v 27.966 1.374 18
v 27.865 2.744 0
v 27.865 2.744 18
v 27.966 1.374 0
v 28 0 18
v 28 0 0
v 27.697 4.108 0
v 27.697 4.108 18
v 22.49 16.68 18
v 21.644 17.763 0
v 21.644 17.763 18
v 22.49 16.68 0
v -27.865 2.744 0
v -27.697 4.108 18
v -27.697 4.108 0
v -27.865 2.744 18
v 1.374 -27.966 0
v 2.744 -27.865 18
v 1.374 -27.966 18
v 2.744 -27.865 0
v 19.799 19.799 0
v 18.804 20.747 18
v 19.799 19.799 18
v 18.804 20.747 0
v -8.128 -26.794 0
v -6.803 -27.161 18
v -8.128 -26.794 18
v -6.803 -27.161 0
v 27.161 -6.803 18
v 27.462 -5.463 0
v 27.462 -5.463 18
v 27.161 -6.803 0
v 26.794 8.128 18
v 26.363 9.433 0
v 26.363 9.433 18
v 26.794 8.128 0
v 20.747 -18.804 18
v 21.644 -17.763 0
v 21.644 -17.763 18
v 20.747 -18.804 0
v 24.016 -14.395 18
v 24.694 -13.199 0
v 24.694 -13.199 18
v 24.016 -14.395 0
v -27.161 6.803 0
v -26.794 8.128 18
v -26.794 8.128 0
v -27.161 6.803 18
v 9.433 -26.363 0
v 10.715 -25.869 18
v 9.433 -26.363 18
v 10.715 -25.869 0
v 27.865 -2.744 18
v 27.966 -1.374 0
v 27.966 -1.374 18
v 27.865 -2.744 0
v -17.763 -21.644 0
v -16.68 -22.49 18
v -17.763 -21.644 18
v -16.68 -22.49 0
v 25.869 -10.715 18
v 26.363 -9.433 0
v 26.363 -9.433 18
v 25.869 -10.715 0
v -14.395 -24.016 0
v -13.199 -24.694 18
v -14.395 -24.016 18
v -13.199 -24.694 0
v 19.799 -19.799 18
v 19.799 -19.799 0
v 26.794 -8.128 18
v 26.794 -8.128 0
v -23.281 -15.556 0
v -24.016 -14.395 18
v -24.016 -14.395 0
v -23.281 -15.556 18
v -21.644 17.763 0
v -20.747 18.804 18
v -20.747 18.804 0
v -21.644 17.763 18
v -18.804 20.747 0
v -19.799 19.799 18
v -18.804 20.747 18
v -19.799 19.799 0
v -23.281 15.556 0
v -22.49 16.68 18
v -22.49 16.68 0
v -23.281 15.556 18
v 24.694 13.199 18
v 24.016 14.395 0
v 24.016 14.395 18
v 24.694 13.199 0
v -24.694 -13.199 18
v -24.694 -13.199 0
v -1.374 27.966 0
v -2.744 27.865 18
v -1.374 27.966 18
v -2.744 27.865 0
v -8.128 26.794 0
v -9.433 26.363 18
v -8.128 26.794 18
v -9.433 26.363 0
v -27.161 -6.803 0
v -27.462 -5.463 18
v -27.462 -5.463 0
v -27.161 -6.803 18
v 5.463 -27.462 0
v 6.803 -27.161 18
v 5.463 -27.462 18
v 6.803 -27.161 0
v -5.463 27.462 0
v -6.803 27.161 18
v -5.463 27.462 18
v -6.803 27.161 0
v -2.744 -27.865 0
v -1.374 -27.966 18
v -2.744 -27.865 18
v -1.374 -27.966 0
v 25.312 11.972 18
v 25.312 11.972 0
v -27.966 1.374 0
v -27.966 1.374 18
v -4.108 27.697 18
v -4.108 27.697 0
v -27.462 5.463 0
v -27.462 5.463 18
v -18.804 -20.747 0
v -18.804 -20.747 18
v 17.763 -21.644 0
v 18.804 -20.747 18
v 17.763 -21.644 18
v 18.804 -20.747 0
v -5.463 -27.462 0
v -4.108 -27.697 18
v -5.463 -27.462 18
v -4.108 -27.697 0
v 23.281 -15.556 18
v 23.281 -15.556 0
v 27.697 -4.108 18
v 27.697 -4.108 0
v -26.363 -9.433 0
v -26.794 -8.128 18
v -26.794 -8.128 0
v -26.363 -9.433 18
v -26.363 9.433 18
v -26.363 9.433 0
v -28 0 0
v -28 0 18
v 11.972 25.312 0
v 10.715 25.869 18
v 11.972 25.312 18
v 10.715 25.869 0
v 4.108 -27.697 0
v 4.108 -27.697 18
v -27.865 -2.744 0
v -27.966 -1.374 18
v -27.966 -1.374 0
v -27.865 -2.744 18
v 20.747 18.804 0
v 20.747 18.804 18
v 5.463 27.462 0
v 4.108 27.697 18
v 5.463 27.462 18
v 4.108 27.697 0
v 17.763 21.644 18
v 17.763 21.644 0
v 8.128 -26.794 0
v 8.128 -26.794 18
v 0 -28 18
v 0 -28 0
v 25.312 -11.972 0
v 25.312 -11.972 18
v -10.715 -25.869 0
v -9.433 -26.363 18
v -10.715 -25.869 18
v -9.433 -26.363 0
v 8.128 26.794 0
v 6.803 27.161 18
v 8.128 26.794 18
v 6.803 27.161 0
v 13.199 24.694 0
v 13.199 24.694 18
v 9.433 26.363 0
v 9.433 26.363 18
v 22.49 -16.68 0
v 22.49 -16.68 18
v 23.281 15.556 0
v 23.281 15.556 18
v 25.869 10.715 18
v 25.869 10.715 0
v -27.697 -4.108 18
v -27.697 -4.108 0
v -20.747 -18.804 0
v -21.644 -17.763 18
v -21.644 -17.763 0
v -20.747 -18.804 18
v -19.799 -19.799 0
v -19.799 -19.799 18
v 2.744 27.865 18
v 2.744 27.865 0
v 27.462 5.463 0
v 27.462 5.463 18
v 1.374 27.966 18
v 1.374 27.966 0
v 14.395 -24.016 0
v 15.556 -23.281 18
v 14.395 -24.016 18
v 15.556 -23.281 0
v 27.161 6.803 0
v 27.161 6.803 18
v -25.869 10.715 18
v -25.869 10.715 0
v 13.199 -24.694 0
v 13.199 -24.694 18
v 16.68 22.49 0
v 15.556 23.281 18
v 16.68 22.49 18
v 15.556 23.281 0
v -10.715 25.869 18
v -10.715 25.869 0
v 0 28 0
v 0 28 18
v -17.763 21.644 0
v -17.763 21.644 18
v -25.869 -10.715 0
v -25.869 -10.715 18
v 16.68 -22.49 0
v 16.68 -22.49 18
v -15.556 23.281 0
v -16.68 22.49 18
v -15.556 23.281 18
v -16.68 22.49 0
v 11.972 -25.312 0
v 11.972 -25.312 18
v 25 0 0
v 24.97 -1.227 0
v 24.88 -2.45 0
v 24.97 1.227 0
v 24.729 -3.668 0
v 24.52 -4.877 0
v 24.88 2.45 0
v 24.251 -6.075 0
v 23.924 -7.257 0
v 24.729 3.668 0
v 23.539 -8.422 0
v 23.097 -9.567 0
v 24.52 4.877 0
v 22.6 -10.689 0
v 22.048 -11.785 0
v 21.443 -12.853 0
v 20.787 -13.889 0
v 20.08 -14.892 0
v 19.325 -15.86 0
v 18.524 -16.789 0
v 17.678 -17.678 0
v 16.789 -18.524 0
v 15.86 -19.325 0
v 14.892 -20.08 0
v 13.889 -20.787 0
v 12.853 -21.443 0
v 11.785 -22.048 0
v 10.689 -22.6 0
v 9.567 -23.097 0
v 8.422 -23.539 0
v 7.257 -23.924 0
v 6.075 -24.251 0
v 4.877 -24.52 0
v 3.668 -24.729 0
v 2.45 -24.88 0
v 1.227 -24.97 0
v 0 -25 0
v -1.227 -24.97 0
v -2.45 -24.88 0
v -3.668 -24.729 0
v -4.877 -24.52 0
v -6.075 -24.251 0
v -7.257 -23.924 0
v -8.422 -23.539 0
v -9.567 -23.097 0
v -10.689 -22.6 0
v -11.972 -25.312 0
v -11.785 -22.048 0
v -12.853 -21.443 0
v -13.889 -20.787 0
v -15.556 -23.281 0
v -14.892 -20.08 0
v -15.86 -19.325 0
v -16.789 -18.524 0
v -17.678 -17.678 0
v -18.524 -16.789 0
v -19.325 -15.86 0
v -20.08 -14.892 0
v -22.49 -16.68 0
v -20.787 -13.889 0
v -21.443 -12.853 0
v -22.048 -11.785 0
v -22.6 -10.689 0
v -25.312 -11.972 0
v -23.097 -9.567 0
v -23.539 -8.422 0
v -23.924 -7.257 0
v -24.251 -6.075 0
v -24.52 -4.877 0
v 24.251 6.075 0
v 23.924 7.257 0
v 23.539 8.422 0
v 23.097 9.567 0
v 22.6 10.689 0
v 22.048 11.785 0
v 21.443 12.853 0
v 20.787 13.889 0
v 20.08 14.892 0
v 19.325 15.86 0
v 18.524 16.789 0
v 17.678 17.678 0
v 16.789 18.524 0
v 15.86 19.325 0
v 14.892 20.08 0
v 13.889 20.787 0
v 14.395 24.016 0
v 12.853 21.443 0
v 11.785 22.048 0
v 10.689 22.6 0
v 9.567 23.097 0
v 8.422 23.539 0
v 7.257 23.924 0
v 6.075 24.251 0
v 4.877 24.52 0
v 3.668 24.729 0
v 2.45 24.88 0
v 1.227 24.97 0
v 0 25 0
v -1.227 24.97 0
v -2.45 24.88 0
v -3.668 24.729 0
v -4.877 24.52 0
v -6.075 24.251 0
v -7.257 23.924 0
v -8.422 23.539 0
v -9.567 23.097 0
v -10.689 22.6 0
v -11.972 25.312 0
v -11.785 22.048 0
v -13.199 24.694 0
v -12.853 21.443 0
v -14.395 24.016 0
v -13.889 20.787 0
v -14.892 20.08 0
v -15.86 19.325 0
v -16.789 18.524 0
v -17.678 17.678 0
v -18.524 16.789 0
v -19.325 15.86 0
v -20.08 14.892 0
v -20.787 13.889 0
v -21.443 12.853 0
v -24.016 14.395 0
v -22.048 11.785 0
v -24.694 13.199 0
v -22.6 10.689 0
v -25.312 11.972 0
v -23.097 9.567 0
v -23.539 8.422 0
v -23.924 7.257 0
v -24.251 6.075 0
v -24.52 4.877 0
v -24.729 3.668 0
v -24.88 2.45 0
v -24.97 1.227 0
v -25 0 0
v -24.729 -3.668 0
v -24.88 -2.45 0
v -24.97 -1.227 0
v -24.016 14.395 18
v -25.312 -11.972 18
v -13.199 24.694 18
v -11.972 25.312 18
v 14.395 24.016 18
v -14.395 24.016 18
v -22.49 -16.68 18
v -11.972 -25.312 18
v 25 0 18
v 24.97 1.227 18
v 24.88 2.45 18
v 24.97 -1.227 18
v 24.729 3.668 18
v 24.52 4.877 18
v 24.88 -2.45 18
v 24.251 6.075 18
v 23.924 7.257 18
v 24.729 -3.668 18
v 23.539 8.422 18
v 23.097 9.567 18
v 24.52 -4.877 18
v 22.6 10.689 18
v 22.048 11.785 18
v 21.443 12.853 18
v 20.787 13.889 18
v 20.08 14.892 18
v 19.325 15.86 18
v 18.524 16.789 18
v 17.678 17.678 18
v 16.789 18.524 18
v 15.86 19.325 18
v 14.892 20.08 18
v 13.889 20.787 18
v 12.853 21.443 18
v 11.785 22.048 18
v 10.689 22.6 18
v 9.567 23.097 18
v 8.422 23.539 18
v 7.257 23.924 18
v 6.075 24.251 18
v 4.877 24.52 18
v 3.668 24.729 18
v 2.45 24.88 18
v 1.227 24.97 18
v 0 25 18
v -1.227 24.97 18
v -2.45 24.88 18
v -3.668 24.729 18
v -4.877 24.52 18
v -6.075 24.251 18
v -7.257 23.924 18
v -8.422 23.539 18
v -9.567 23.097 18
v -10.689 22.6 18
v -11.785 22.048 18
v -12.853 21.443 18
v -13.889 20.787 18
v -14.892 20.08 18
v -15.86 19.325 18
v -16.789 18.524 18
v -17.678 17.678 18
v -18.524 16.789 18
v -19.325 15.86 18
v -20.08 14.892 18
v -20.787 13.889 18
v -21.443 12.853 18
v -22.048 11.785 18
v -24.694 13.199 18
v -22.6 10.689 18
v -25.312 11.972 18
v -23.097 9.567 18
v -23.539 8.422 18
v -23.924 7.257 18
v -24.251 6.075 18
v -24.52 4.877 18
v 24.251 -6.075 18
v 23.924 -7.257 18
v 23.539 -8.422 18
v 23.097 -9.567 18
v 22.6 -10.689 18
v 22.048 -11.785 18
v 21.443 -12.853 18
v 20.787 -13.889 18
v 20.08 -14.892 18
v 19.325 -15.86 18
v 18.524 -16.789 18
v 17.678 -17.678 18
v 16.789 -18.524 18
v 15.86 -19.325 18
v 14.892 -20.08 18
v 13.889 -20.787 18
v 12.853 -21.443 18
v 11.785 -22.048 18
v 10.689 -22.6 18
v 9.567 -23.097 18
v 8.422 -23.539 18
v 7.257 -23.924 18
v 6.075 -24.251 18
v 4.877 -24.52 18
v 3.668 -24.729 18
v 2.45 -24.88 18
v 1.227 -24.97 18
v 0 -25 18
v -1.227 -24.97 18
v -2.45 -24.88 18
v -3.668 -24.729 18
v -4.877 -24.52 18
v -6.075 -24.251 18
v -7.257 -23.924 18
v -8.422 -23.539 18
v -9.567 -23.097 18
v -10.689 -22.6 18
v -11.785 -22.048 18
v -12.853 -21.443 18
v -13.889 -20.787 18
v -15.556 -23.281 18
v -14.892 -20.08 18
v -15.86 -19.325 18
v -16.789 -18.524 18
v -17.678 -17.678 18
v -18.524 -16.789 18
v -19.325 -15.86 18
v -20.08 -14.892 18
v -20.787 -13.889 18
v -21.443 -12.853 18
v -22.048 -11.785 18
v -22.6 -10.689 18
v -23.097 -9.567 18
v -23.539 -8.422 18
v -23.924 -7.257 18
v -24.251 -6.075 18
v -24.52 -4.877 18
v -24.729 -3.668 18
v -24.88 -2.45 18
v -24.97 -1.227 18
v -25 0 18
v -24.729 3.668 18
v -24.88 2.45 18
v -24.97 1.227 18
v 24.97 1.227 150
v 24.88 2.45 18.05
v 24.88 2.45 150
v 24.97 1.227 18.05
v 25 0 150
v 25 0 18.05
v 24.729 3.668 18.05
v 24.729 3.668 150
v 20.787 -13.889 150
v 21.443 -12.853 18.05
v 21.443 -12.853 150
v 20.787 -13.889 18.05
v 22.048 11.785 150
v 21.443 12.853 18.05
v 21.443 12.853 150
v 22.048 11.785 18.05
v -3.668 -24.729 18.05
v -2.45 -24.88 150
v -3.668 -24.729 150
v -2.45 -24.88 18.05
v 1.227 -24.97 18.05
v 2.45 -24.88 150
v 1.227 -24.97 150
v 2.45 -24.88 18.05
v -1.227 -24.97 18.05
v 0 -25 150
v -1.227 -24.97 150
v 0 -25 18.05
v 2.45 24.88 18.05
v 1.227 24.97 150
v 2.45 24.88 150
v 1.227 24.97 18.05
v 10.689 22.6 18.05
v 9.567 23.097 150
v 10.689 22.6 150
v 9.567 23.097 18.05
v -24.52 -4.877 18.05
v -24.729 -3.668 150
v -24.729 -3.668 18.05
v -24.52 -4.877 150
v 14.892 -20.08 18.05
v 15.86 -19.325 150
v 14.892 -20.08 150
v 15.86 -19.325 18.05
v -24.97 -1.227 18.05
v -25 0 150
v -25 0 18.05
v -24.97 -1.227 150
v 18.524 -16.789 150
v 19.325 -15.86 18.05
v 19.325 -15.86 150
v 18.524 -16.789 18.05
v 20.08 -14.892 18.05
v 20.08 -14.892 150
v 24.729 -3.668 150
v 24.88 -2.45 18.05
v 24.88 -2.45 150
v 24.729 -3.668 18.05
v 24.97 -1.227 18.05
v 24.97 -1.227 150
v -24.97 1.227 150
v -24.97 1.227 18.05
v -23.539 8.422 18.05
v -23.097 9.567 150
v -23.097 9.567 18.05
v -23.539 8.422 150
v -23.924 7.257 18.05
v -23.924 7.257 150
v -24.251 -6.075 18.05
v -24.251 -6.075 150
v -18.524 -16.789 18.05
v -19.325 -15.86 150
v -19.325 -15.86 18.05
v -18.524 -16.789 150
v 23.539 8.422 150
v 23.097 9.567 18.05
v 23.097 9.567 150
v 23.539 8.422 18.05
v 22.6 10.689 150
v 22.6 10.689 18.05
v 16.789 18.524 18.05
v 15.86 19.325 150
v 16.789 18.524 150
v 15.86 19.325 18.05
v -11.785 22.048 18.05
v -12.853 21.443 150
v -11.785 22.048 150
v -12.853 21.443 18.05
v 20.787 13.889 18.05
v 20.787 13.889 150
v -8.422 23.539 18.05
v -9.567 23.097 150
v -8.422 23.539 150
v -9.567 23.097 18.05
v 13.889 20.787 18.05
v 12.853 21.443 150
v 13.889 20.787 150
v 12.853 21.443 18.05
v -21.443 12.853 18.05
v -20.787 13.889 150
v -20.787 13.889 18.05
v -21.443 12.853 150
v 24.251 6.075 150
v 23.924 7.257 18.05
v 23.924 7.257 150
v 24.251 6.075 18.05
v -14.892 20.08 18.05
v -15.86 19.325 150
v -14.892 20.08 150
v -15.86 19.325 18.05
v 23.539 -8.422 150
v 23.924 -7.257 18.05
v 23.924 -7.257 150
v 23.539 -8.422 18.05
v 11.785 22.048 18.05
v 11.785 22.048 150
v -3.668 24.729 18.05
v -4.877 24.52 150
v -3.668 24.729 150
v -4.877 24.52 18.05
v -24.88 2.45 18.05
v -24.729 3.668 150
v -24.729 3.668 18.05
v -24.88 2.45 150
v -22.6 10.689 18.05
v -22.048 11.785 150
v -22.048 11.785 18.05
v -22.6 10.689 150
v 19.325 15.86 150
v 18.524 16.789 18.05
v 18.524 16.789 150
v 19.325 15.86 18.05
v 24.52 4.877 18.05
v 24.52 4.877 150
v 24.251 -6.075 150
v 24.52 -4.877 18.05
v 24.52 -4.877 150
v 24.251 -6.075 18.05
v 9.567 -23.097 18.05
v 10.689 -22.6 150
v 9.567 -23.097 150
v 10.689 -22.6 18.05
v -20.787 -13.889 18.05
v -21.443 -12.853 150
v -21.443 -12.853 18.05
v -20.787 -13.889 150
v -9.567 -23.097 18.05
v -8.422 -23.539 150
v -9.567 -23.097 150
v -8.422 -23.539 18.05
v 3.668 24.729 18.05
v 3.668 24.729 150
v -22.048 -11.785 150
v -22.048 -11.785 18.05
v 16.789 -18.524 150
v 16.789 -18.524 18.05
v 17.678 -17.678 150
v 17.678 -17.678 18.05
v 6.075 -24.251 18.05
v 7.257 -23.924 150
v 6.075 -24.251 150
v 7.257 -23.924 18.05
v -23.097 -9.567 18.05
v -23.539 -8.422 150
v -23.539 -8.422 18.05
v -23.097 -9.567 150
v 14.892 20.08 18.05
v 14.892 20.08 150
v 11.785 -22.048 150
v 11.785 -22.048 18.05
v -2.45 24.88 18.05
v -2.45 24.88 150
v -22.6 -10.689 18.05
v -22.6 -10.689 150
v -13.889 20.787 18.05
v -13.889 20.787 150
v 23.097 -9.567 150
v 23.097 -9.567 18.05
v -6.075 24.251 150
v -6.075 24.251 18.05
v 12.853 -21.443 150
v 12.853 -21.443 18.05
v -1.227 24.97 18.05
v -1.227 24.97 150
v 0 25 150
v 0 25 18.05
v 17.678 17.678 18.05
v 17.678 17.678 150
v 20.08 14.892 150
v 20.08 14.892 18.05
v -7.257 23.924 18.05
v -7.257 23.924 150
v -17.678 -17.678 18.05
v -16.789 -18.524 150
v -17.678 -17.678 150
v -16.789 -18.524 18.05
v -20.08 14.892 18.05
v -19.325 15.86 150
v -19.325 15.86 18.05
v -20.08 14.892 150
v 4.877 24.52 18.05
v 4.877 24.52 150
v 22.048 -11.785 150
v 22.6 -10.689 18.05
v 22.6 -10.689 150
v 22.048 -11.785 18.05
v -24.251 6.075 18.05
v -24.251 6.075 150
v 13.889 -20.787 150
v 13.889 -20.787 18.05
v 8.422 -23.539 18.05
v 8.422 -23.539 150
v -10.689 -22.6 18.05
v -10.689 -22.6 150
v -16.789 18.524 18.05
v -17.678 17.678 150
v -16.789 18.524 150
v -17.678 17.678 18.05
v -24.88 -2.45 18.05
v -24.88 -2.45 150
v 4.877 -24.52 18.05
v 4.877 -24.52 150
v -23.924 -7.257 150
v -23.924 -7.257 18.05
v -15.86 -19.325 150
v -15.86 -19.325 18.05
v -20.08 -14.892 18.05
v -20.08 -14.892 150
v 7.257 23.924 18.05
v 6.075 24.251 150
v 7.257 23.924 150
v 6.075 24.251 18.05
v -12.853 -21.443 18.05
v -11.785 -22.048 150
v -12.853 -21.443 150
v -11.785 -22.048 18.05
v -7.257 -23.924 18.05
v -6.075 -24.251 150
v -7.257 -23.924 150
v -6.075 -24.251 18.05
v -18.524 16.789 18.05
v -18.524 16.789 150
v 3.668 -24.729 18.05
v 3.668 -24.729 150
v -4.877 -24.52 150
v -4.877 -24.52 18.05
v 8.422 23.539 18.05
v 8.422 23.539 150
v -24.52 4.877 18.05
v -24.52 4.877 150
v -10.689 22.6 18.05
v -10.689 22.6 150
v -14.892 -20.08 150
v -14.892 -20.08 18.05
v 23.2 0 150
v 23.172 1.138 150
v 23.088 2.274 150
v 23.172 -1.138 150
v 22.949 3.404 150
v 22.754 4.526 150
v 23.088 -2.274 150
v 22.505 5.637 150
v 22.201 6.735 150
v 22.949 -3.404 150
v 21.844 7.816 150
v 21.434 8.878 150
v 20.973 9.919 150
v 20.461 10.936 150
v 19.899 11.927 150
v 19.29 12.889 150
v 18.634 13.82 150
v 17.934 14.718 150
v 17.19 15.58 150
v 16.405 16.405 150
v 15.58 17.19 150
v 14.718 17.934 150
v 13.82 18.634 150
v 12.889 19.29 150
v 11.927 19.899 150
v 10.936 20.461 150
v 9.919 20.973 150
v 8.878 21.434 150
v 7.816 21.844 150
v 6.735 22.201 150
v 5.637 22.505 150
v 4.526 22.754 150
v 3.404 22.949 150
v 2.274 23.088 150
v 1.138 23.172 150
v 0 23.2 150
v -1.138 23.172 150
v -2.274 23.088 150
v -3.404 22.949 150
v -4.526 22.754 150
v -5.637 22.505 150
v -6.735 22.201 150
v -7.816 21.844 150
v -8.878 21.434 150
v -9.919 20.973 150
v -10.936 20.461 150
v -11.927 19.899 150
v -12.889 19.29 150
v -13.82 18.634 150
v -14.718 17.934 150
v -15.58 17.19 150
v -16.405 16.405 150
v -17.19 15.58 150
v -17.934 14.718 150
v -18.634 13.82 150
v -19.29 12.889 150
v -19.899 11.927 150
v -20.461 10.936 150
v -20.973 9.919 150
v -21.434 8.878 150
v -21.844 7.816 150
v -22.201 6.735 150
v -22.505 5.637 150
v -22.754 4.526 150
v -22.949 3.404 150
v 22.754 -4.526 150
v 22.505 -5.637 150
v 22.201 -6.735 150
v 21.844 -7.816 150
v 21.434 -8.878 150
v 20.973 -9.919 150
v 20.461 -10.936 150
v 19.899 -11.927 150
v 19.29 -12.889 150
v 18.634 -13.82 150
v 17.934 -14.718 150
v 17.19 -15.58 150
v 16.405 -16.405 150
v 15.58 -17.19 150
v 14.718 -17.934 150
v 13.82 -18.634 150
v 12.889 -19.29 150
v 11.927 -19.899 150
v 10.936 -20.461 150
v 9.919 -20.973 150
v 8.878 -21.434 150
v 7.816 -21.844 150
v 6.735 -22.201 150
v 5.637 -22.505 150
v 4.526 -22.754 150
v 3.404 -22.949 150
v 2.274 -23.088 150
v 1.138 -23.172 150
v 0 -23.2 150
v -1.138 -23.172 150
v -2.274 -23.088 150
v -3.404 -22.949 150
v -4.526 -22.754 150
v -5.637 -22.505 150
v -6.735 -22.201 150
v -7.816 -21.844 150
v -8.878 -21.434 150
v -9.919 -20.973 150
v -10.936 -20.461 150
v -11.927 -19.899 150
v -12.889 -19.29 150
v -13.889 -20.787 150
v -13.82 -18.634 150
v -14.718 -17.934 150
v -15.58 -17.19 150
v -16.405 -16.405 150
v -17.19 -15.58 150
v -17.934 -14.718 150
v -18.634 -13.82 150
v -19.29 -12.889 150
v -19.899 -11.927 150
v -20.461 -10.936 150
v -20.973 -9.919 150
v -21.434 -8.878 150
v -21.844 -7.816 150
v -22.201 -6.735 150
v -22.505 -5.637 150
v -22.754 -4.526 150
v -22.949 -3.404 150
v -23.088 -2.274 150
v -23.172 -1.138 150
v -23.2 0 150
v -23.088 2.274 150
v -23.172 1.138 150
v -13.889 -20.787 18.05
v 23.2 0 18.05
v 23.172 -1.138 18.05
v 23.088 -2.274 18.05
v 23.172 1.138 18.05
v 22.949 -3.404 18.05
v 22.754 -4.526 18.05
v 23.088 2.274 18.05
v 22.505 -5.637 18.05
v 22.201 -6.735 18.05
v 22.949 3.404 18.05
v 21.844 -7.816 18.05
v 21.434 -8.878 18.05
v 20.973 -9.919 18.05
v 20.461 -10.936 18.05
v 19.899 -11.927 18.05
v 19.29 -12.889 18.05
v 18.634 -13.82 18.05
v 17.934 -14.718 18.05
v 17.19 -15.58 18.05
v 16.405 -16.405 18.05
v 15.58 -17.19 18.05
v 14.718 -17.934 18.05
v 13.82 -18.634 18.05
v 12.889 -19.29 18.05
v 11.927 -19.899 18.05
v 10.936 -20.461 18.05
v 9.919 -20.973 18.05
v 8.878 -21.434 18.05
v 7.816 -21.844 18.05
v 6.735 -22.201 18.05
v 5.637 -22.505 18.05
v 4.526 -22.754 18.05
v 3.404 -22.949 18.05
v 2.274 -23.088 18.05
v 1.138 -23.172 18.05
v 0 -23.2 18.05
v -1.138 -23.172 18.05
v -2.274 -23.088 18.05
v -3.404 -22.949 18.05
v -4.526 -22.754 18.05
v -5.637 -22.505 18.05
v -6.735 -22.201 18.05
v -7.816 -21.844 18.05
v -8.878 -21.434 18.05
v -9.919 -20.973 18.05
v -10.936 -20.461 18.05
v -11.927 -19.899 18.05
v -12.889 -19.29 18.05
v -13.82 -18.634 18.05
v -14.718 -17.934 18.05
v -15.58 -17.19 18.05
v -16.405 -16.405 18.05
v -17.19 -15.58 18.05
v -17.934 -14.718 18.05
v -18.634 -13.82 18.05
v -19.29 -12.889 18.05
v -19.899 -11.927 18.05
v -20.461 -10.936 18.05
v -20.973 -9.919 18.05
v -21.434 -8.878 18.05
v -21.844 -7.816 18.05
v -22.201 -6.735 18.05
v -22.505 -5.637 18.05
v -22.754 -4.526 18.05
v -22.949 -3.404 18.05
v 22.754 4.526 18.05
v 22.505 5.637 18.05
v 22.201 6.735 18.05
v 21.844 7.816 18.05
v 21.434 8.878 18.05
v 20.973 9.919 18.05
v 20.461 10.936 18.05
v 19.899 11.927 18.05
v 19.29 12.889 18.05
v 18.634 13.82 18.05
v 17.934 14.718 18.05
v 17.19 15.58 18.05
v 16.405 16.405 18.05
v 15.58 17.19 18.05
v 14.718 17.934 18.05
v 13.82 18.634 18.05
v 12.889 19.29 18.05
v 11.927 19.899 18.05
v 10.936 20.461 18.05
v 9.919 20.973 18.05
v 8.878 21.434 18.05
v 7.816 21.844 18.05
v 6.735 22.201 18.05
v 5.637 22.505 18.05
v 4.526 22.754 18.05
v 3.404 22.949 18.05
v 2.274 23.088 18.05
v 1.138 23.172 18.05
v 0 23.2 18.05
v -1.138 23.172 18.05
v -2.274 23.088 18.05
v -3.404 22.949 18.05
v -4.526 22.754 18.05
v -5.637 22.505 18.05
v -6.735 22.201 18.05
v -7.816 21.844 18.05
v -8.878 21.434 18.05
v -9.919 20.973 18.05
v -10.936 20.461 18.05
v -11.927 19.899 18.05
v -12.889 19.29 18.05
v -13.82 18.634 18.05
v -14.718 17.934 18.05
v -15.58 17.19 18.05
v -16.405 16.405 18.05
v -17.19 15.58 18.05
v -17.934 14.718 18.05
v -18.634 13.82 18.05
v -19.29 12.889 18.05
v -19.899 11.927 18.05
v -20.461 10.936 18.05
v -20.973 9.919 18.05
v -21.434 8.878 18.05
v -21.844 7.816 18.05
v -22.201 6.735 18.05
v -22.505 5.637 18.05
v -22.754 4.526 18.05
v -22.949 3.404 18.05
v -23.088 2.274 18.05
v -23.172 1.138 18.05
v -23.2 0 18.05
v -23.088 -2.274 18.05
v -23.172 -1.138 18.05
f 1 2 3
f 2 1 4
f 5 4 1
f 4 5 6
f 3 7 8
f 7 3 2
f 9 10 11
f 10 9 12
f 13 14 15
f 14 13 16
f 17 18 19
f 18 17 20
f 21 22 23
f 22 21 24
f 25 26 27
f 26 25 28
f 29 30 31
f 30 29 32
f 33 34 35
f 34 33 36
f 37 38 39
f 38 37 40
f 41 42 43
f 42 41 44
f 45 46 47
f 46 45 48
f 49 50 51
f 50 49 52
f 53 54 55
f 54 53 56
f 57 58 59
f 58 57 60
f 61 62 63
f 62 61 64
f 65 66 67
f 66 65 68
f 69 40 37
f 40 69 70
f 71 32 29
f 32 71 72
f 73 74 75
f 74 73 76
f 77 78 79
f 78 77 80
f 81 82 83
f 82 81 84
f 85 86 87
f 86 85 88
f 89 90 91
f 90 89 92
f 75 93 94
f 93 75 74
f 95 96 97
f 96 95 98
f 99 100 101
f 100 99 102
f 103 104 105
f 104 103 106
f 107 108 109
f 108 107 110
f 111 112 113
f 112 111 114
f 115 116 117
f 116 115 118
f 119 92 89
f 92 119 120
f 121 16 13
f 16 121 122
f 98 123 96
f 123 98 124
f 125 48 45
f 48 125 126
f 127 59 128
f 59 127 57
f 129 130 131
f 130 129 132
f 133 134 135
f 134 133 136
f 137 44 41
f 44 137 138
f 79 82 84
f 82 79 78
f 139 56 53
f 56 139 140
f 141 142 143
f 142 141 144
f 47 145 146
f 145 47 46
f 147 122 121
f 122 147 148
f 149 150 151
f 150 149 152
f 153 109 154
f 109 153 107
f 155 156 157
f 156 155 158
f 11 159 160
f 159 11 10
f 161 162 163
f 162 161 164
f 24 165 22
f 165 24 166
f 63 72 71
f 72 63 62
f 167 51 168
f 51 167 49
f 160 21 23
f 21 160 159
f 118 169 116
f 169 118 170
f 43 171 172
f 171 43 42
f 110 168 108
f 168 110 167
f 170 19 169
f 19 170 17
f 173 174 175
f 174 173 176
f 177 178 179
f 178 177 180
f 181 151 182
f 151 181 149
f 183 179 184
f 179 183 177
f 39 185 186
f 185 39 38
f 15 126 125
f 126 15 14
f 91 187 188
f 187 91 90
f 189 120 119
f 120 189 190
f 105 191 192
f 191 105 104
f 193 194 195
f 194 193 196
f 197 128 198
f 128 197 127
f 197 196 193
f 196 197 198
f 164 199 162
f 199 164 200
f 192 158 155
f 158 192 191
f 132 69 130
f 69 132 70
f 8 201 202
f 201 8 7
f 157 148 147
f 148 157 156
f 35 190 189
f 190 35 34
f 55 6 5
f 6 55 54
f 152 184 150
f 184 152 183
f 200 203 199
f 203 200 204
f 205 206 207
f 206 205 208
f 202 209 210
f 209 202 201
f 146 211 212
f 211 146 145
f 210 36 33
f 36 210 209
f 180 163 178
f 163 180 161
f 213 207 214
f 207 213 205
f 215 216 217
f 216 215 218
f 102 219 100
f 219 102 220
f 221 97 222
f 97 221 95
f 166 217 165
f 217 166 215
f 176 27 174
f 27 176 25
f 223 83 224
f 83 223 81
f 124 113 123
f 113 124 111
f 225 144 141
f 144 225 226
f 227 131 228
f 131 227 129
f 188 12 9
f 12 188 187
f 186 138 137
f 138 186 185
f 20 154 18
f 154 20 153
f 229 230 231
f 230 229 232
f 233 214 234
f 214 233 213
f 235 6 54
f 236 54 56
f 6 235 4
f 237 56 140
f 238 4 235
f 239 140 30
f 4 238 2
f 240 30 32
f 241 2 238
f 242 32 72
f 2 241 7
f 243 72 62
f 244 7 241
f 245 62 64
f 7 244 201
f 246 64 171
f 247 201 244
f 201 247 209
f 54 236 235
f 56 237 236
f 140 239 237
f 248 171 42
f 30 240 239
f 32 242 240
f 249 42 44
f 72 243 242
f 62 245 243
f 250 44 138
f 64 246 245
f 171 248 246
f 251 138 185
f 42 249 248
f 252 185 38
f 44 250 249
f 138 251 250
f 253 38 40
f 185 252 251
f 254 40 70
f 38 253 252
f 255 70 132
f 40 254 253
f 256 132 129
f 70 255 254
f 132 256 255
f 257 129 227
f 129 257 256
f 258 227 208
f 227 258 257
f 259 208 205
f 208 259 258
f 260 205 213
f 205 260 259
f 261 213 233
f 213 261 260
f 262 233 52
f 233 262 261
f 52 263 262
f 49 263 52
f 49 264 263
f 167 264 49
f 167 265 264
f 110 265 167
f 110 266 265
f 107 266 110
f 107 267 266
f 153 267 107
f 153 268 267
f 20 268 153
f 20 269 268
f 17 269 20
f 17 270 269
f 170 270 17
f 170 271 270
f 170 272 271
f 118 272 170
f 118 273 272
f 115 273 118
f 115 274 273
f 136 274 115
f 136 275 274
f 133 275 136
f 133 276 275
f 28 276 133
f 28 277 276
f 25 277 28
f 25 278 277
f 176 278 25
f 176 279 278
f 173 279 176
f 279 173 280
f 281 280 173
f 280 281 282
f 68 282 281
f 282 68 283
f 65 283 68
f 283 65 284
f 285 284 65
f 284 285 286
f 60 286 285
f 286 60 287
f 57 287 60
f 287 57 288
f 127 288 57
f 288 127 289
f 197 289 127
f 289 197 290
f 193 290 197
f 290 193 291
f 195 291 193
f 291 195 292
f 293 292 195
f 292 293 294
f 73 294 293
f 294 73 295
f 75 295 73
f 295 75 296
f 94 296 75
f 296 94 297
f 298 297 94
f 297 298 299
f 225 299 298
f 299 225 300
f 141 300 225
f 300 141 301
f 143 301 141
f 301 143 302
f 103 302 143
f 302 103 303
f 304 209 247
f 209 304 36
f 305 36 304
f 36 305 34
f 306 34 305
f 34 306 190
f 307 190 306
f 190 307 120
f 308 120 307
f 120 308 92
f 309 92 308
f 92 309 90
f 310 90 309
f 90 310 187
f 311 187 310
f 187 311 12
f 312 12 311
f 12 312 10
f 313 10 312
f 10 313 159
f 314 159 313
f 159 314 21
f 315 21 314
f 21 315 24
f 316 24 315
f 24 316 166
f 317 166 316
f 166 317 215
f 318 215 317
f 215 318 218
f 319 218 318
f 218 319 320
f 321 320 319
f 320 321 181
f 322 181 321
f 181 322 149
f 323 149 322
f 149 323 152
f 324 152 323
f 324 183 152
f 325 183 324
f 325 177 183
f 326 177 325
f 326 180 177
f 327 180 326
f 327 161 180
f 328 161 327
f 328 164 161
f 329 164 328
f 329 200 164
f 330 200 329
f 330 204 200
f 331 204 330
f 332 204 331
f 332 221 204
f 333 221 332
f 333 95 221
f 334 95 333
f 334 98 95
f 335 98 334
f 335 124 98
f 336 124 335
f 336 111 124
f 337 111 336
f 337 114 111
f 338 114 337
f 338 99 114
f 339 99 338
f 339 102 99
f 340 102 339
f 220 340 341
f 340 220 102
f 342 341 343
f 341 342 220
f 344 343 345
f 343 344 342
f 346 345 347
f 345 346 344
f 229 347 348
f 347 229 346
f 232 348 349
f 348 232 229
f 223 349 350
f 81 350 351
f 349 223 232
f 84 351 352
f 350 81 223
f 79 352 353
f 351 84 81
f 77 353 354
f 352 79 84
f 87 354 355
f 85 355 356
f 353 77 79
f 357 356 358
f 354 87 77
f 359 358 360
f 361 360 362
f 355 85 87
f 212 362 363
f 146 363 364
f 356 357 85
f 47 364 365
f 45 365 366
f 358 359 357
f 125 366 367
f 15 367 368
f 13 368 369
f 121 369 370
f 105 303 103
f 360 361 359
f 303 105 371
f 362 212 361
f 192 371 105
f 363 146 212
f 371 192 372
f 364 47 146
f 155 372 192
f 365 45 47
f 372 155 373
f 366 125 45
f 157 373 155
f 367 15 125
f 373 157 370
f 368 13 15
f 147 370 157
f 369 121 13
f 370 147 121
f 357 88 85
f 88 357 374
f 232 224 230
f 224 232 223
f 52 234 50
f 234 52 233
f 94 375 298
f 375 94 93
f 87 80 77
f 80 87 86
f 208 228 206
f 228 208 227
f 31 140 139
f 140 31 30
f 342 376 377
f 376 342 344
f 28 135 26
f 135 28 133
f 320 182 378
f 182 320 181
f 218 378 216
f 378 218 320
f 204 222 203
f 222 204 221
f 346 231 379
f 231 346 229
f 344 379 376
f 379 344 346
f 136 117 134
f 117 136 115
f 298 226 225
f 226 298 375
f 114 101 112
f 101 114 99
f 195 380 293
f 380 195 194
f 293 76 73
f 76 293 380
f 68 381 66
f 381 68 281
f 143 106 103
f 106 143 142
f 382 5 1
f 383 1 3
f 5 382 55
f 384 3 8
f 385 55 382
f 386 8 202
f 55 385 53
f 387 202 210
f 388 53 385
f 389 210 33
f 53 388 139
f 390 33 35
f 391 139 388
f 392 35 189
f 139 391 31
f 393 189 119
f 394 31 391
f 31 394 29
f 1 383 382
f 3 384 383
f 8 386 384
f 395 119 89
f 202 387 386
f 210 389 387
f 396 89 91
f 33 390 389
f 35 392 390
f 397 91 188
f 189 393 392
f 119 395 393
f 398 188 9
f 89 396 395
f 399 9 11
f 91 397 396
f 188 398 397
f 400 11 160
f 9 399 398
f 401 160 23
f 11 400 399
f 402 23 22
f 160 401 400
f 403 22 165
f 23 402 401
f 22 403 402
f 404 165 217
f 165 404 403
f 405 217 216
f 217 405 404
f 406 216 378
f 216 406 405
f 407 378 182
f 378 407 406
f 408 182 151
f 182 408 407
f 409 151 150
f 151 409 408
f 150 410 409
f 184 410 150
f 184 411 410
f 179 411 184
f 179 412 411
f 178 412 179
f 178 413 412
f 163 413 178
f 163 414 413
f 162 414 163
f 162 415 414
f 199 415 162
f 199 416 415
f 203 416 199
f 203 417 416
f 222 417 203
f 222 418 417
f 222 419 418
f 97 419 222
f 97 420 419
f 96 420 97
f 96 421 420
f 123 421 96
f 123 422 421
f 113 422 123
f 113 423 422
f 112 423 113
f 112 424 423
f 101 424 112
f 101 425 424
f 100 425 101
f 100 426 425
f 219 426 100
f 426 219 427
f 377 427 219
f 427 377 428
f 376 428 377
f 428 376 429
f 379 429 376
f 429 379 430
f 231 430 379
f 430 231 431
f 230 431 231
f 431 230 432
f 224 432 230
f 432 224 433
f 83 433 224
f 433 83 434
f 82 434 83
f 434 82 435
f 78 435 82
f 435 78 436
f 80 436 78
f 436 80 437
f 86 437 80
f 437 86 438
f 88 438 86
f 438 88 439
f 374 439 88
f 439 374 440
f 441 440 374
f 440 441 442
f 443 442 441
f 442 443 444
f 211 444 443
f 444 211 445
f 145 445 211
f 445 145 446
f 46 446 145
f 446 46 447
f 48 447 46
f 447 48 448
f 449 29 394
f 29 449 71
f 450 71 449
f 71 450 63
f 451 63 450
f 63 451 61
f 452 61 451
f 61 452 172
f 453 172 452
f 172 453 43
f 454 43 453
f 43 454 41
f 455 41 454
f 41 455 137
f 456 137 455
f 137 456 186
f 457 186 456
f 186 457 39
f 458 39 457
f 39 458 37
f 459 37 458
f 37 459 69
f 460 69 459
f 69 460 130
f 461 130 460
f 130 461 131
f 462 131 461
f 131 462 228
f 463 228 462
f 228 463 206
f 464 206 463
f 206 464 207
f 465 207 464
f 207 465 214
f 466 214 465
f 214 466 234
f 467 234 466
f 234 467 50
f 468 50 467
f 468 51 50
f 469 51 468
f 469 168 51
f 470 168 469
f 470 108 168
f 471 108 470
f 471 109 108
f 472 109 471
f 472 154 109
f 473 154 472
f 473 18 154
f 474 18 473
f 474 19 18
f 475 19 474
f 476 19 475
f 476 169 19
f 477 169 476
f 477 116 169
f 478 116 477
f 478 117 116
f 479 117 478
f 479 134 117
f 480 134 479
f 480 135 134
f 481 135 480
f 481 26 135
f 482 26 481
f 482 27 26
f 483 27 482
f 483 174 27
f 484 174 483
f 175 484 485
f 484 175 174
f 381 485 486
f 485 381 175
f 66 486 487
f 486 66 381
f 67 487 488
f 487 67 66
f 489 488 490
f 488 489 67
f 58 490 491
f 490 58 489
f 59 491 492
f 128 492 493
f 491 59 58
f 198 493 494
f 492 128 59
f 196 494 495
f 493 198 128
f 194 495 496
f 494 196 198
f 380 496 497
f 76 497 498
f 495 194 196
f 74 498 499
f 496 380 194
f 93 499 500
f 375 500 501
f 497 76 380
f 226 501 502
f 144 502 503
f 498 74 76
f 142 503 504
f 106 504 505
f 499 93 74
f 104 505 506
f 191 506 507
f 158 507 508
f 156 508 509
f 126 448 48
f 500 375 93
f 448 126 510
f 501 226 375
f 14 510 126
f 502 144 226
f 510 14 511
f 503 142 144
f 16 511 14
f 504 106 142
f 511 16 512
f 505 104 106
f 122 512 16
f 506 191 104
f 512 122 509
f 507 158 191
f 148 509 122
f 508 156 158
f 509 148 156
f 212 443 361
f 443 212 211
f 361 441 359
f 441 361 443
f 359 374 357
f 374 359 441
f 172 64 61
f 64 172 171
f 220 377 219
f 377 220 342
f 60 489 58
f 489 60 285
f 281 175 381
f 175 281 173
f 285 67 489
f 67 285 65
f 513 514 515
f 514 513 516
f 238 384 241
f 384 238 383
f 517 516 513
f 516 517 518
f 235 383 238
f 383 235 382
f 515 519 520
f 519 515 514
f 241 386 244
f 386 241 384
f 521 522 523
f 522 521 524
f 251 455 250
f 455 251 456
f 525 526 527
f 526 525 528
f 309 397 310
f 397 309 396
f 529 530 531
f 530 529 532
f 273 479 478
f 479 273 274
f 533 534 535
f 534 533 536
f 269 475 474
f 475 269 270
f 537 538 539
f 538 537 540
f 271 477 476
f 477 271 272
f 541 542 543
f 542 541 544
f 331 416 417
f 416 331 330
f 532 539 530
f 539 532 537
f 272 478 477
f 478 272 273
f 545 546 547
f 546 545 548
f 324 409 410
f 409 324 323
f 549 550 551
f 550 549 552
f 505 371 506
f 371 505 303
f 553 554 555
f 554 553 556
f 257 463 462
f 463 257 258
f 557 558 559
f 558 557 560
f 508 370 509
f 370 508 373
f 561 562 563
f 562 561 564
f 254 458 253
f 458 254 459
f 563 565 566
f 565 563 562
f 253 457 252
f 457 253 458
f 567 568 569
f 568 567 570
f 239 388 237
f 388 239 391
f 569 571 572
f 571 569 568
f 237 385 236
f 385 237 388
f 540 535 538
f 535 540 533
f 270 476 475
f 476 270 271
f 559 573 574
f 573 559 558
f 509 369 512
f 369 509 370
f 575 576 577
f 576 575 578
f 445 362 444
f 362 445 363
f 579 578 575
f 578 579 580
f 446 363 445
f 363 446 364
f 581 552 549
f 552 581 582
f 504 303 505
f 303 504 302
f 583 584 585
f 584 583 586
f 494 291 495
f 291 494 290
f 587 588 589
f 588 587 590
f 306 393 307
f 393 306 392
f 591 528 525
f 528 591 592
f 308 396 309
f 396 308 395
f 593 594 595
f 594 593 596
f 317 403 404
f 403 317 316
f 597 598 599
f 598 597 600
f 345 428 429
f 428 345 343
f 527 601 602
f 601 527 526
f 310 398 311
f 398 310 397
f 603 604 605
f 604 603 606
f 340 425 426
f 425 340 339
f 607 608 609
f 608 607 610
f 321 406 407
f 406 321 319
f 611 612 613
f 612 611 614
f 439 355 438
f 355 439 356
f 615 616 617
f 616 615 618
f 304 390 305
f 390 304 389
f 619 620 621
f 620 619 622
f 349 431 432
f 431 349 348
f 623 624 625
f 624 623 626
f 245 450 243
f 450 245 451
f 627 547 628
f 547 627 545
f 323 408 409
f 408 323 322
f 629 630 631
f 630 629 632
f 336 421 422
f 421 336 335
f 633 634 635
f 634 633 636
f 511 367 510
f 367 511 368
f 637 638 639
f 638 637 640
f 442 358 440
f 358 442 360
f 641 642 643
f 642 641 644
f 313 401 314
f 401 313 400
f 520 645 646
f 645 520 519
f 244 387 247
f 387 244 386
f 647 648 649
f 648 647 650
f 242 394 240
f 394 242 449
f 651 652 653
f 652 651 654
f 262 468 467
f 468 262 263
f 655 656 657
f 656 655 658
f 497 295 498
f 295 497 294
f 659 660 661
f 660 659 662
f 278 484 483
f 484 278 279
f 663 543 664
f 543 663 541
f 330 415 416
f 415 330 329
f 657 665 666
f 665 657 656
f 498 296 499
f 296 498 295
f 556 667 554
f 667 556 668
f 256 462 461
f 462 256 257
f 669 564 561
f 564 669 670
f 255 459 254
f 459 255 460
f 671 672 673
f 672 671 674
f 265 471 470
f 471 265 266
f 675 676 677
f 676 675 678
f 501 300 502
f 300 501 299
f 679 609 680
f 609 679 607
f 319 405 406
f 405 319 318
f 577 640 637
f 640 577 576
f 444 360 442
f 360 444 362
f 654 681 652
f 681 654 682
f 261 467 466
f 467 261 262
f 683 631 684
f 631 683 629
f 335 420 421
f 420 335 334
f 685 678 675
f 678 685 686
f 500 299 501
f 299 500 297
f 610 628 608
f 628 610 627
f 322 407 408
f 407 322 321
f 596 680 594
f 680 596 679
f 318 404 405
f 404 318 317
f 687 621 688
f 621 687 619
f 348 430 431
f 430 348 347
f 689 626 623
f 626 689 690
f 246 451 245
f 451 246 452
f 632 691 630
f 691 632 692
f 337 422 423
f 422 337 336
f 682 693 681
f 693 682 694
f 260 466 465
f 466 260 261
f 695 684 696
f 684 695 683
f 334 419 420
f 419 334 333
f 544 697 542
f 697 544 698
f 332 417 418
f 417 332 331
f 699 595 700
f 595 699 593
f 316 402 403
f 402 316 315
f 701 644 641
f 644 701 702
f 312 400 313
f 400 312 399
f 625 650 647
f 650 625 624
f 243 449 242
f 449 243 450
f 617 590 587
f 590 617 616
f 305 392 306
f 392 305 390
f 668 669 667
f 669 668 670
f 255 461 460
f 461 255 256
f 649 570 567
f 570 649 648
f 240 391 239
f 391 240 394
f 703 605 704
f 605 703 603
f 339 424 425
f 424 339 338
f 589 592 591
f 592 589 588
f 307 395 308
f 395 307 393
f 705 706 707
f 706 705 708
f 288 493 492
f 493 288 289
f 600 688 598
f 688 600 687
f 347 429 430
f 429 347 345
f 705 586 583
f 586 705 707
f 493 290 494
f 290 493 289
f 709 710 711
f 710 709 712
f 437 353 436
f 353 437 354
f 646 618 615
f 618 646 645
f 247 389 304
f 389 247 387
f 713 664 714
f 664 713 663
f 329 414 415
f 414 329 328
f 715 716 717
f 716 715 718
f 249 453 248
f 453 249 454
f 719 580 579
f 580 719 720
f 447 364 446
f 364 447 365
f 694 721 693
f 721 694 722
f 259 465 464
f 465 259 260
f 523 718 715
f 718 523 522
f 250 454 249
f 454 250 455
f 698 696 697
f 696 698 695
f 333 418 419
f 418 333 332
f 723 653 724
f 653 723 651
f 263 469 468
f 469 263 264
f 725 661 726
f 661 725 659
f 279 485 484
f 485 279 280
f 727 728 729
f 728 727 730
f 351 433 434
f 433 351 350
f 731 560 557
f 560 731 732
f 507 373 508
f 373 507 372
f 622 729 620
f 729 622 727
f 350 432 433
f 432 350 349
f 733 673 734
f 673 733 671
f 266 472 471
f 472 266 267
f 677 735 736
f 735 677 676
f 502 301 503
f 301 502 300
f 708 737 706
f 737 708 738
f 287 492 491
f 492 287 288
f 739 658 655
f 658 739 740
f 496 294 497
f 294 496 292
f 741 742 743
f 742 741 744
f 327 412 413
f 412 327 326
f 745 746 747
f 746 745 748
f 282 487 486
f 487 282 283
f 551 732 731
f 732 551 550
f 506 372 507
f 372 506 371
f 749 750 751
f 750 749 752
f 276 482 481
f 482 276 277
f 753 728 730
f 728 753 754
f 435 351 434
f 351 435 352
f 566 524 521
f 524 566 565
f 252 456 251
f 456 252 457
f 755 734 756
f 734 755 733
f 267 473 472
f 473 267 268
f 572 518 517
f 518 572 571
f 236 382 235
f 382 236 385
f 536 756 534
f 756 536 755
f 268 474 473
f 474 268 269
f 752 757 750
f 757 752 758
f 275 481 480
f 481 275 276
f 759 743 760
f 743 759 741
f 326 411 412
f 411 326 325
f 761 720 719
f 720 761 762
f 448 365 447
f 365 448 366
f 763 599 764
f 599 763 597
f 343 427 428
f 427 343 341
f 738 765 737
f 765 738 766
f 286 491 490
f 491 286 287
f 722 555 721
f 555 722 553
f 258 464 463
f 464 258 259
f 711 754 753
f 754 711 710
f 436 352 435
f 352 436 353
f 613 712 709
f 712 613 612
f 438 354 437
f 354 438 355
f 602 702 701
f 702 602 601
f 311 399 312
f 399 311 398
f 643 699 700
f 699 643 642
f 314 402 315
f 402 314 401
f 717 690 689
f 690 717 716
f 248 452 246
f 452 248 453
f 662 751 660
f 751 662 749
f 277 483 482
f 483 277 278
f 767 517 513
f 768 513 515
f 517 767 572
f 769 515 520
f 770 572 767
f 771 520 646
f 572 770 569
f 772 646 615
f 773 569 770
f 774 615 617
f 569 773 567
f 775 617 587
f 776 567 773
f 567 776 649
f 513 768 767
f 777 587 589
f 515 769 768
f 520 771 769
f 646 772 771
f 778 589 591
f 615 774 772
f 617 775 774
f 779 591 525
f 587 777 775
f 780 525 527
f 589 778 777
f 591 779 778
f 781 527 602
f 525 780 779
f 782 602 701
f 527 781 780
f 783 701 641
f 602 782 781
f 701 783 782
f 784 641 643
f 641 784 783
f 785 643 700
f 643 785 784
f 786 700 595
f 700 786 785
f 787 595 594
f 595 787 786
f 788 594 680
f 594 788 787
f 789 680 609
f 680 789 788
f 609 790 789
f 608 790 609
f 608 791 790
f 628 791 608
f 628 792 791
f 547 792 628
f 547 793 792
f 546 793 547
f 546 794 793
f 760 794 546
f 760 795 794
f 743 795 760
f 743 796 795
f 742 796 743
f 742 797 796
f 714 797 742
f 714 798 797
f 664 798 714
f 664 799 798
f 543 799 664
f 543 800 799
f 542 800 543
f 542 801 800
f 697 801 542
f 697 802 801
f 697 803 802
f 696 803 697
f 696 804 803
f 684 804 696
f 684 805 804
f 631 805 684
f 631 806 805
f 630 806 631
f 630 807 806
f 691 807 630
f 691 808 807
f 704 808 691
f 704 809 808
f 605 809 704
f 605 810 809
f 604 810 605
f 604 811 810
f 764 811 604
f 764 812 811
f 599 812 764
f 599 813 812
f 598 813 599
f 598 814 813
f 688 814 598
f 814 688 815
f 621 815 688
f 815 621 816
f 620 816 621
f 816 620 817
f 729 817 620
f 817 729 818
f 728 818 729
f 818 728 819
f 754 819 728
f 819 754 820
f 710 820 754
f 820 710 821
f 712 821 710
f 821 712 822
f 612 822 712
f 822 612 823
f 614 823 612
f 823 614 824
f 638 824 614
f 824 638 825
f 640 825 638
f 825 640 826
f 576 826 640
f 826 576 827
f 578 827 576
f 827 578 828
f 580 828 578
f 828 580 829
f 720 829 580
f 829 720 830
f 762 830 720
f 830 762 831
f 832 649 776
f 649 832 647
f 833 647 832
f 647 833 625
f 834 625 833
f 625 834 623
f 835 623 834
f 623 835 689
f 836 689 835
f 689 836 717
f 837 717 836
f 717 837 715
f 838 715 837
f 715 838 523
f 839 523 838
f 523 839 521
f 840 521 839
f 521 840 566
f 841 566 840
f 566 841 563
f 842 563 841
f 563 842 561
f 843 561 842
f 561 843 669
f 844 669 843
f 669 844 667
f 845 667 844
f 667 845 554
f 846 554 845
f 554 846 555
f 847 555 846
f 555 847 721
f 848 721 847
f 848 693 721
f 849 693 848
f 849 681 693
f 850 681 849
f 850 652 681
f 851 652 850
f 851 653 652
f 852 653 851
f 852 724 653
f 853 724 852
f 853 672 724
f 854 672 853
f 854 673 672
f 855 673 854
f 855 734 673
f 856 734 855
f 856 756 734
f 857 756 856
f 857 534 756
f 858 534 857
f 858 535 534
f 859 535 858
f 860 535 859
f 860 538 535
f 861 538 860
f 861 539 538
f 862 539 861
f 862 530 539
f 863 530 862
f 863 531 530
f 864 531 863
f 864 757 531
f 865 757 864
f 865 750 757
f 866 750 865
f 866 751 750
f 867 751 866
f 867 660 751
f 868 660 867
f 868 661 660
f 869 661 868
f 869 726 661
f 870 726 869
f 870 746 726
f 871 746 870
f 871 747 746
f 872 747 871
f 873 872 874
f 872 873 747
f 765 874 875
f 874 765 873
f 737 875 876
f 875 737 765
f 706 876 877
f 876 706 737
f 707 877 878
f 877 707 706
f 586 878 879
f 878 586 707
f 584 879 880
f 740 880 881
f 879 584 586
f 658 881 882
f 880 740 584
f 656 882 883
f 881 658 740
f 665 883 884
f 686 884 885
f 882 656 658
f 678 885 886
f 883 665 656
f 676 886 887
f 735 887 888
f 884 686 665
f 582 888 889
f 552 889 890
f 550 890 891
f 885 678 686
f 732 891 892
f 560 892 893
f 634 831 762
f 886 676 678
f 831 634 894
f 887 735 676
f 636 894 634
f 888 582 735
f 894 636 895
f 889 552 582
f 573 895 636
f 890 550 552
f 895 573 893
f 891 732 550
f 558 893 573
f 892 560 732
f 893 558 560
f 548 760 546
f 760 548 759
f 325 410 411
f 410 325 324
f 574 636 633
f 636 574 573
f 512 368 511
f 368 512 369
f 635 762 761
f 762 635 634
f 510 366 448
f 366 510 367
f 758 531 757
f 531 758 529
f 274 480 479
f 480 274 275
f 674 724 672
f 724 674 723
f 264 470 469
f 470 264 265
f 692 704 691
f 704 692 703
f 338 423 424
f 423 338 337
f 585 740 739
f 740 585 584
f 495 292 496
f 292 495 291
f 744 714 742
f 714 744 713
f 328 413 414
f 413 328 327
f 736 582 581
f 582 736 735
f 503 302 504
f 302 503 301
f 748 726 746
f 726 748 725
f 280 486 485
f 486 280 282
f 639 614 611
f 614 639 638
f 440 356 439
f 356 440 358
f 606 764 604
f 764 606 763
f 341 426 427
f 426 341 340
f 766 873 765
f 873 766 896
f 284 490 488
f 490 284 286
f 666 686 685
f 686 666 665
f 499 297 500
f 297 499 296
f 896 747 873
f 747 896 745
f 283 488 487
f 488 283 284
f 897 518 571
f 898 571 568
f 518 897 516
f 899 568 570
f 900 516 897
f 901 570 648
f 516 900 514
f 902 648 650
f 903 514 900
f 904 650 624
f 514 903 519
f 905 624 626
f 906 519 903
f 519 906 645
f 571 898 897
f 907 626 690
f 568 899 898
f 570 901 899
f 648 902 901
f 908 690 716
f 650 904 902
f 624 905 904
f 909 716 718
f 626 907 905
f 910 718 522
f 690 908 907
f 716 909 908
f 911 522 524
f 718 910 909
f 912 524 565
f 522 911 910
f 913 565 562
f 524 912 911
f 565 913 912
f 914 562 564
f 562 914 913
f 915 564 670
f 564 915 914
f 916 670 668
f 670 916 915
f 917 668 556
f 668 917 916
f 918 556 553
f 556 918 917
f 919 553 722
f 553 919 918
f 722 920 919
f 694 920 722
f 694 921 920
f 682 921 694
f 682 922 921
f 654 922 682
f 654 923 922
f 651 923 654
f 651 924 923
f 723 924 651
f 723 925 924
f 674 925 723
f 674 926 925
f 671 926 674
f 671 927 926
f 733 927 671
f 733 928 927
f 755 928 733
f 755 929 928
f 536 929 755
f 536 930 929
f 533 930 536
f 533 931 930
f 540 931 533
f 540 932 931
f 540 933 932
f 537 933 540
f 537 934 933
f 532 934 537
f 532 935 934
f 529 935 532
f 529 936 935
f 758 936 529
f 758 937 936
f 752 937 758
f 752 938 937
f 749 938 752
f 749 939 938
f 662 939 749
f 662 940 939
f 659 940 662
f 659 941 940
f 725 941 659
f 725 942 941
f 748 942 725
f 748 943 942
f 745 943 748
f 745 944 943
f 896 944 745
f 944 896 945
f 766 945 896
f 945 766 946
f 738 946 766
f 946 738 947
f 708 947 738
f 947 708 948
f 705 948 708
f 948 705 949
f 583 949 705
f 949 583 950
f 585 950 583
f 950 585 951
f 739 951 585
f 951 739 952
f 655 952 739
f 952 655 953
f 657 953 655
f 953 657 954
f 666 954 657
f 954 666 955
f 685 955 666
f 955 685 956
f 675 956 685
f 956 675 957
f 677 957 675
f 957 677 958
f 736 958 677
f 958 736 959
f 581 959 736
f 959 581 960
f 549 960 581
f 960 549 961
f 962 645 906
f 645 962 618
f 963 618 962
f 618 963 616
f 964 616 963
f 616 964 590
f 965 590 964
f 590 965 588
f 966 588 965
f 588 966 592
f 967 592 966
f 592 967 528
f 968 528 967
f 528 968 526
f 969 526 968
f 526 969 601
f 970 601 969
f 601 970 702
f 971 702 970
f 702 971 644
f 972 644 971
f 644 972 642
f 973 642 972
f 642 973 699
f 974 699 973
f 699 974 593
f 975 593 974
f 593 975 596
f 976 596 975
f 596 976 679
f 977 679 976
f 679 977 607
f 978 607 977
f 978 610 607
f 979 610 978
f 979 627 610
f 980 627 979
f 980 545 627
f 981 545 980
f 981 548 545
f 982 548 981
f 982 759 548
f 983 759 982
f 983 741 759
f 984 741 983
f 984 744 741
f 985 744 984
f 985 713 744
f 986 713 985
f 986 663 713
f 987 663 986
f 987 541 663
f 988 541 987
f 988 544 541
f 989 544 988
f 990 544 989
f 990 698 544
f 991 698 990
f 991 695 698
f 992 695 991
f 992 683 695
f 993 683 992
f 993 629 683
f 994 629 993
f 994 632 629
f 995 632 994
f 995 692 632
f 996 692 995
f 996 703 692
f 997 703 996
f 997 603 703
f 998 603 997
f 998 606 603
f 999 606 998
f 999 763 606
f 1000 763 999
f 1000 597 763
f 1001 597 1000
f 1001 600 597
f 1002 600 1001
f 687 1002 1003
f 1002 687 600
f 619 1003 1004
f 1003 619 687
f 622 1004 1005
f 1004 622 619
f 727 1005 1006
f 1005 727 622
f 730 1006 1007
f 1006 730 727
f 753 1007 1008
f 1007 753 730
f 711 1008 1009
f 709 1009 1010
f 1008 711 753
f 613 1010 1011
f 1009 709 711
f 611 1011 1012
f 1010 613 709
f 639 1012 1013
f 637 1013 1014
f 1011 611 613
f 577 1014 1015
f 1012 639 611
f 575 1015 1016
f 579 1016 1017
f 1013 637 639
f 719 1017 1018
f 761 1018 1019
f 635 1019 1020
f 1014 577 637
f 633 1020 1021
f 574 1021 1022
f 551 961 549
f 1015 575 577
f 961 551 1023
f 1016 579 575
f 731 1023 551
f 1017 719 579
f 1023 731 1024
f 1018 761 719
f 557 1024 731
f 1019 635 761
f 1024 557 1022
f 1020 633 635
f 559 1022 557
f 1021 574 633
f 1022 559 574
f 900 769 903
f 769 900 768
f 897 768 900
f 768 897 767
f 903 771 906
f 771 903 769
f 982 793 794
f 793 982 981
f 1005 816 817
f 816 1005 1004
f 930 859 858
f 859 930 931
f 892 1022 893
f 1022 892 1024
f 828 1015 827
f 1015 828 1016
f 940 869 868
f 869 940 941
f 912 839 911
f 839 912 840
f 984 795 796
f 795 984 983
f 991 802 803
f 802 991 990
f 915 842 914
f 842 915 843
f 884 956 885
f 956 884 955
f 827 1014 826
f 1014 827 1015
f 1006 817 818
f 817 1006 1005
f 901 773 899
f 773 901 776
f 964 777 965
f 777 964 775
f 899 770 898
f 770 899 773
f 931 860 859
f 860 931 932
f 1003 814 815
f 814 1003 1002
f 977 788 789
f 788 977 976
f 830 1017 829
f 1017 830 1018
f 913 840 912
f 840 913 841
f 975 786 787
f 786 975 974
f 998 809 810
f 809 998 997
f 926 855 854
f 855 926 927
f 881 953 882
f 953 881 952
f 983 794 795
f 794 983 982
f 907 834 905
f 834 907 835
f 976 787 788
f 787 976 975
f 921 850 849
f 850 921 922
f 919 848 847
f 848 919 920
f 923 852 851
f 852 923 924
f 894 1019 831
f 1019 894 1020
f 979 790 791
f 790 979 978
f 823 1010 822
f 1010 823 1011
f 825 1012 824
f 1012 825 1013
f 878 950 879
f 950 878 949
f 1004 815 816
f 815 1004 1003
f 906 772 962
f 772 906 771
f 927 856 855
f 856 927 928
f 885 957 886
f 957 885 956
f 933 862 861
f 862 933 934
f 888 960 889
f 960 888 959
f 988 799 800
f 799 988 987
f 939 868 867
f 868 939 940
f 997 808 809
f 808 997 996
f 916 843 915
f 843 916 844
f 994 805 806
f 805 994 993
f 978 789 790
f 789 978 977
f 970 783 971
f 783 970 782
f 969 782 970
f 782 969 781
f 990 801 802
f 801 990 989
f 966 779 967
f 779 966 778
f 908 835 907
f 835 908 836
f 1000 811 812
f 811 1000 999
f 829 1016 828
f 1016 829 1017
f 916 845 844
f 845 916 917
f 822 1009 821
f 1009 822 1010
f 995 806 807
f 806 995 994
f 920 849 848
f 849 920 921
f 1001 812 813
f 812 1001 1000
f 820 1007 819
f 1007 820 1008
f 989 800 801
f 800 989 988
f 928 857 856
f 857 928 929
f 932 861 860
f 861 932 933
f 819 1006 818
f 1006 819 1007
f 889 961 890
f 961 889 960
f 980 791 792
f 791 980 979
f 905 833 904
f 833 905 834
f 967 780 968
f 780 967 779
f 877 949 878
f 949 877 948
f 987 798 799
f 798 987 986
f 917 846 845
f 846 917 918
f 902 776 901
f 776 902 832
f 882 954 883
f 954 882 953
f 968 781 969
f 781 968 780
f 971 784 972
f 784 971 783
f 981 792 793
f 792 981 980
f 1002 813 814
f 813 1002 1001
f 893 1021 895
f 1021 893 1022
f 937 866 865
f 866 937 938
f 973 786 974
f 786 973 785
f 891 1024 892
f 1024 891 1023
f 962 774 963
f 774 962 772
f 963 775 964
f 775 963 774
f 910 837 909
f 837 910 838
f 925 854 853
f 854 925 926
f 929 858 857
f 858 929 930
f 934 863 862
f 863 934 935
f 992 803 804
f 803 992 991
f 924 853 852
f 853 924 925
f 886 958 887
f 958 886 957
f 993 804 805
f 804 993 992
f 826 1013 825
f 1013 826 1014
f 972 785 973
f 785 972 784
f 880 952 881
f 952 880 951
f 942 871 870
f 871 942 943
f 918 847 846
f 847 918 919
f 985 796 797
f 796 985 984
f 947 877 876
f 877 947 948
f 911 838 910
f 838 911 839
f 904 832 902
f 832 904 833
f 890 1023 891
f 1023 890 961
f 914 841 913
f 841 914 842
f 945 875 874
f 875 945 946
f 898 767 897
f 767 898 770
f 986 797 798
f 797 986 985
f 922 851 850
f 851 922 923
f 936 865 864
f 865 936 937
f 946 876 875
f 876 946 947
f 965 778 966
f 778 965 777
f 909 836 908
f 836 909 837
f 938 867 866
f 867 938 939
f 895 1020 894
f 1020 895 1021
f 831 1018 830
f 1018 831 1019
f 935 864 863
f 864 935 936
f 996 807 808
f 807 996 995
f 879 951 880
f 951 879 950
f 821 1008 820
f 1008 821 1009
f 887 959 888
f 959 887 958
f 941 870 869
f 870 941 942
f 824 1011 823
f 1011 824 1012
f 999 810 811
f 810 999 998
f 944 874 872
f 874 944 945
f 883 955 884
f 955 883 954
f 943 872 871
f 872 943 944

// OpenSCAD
$fn = 128;

// Parameters
pipe_standard = 1; //[1:1:1]
nominal_diameter = 50; //[25:100:1]
length_mm = 150; //[75:300:1]
type_descriptor = 1; //[1:1:1]
pipe_od = 50; //[25:100:1]
pipe_wall = 1.8; //[0.9:3.6:0.1]
fitting_length = 18; //[9:36:1]
fitting_od_scale = 1.12; //[1.05:1.3:0.01]
fitting_wall_extra = 1.2; //[0.6:2.4:0.1]
connection_overlap = 1; //[0.5:2:0.1]

eps = 0.05;

module ht_pipe_150_with_socket() {
    // Derived dimensions
    pipe_r_out = pipe_od/2;
    pipe_r_in  = max(0.01, pipe_r_out - pipe_wall);

    fit_od    = pipe_od * fitting_od_scale;
    fit_r_out = fit_od/2;
    fit_wall  = pipe_wall + fitting_wall_extra;
    fit_r_in  = max(0.01, fit_r_out - fit_wall);

    // Socket at bottom end (z=0), overlapping into pipe by connection_overlap
    overlap = min(connection_overlap, fitting_length - eps);
    pipe_z0 = fitting_length - overlap;          // pipe starts inside socket to ensure connectivity
    pipe_h  = max(eps, length_mm - pipe_z0);     // total length from z=0 to z=length_mm

    color([0.85, 0.85, 0.8])
    difference() {
        // Outer solid (connected)
        union() {
            // Socket outer
            cylinder(h=fitting_length, r=fit_r_out, center=false);

            // Main pipe outer (starts inside socket by overlap)
            translate([0, 0, pipe_z0])
                cylinder(h=pipe_h, r=pipe_r_out, center=false);
        }

        // Inner voids (connected cavity)
        union() {
            // Socket inner (open mouth at z=0)
            cylinder(h=fitting_length + eps, r=fit_r_in, center=false);

            // Main pipe inner (starts at pipe start; open at top)
            translate([0, 0, pipe_z0])
                cylinder(h=pipe_h + eps, r=pipe_r_in, center=false);
        }
    }
}

ht_pipe_150_with_socket();
